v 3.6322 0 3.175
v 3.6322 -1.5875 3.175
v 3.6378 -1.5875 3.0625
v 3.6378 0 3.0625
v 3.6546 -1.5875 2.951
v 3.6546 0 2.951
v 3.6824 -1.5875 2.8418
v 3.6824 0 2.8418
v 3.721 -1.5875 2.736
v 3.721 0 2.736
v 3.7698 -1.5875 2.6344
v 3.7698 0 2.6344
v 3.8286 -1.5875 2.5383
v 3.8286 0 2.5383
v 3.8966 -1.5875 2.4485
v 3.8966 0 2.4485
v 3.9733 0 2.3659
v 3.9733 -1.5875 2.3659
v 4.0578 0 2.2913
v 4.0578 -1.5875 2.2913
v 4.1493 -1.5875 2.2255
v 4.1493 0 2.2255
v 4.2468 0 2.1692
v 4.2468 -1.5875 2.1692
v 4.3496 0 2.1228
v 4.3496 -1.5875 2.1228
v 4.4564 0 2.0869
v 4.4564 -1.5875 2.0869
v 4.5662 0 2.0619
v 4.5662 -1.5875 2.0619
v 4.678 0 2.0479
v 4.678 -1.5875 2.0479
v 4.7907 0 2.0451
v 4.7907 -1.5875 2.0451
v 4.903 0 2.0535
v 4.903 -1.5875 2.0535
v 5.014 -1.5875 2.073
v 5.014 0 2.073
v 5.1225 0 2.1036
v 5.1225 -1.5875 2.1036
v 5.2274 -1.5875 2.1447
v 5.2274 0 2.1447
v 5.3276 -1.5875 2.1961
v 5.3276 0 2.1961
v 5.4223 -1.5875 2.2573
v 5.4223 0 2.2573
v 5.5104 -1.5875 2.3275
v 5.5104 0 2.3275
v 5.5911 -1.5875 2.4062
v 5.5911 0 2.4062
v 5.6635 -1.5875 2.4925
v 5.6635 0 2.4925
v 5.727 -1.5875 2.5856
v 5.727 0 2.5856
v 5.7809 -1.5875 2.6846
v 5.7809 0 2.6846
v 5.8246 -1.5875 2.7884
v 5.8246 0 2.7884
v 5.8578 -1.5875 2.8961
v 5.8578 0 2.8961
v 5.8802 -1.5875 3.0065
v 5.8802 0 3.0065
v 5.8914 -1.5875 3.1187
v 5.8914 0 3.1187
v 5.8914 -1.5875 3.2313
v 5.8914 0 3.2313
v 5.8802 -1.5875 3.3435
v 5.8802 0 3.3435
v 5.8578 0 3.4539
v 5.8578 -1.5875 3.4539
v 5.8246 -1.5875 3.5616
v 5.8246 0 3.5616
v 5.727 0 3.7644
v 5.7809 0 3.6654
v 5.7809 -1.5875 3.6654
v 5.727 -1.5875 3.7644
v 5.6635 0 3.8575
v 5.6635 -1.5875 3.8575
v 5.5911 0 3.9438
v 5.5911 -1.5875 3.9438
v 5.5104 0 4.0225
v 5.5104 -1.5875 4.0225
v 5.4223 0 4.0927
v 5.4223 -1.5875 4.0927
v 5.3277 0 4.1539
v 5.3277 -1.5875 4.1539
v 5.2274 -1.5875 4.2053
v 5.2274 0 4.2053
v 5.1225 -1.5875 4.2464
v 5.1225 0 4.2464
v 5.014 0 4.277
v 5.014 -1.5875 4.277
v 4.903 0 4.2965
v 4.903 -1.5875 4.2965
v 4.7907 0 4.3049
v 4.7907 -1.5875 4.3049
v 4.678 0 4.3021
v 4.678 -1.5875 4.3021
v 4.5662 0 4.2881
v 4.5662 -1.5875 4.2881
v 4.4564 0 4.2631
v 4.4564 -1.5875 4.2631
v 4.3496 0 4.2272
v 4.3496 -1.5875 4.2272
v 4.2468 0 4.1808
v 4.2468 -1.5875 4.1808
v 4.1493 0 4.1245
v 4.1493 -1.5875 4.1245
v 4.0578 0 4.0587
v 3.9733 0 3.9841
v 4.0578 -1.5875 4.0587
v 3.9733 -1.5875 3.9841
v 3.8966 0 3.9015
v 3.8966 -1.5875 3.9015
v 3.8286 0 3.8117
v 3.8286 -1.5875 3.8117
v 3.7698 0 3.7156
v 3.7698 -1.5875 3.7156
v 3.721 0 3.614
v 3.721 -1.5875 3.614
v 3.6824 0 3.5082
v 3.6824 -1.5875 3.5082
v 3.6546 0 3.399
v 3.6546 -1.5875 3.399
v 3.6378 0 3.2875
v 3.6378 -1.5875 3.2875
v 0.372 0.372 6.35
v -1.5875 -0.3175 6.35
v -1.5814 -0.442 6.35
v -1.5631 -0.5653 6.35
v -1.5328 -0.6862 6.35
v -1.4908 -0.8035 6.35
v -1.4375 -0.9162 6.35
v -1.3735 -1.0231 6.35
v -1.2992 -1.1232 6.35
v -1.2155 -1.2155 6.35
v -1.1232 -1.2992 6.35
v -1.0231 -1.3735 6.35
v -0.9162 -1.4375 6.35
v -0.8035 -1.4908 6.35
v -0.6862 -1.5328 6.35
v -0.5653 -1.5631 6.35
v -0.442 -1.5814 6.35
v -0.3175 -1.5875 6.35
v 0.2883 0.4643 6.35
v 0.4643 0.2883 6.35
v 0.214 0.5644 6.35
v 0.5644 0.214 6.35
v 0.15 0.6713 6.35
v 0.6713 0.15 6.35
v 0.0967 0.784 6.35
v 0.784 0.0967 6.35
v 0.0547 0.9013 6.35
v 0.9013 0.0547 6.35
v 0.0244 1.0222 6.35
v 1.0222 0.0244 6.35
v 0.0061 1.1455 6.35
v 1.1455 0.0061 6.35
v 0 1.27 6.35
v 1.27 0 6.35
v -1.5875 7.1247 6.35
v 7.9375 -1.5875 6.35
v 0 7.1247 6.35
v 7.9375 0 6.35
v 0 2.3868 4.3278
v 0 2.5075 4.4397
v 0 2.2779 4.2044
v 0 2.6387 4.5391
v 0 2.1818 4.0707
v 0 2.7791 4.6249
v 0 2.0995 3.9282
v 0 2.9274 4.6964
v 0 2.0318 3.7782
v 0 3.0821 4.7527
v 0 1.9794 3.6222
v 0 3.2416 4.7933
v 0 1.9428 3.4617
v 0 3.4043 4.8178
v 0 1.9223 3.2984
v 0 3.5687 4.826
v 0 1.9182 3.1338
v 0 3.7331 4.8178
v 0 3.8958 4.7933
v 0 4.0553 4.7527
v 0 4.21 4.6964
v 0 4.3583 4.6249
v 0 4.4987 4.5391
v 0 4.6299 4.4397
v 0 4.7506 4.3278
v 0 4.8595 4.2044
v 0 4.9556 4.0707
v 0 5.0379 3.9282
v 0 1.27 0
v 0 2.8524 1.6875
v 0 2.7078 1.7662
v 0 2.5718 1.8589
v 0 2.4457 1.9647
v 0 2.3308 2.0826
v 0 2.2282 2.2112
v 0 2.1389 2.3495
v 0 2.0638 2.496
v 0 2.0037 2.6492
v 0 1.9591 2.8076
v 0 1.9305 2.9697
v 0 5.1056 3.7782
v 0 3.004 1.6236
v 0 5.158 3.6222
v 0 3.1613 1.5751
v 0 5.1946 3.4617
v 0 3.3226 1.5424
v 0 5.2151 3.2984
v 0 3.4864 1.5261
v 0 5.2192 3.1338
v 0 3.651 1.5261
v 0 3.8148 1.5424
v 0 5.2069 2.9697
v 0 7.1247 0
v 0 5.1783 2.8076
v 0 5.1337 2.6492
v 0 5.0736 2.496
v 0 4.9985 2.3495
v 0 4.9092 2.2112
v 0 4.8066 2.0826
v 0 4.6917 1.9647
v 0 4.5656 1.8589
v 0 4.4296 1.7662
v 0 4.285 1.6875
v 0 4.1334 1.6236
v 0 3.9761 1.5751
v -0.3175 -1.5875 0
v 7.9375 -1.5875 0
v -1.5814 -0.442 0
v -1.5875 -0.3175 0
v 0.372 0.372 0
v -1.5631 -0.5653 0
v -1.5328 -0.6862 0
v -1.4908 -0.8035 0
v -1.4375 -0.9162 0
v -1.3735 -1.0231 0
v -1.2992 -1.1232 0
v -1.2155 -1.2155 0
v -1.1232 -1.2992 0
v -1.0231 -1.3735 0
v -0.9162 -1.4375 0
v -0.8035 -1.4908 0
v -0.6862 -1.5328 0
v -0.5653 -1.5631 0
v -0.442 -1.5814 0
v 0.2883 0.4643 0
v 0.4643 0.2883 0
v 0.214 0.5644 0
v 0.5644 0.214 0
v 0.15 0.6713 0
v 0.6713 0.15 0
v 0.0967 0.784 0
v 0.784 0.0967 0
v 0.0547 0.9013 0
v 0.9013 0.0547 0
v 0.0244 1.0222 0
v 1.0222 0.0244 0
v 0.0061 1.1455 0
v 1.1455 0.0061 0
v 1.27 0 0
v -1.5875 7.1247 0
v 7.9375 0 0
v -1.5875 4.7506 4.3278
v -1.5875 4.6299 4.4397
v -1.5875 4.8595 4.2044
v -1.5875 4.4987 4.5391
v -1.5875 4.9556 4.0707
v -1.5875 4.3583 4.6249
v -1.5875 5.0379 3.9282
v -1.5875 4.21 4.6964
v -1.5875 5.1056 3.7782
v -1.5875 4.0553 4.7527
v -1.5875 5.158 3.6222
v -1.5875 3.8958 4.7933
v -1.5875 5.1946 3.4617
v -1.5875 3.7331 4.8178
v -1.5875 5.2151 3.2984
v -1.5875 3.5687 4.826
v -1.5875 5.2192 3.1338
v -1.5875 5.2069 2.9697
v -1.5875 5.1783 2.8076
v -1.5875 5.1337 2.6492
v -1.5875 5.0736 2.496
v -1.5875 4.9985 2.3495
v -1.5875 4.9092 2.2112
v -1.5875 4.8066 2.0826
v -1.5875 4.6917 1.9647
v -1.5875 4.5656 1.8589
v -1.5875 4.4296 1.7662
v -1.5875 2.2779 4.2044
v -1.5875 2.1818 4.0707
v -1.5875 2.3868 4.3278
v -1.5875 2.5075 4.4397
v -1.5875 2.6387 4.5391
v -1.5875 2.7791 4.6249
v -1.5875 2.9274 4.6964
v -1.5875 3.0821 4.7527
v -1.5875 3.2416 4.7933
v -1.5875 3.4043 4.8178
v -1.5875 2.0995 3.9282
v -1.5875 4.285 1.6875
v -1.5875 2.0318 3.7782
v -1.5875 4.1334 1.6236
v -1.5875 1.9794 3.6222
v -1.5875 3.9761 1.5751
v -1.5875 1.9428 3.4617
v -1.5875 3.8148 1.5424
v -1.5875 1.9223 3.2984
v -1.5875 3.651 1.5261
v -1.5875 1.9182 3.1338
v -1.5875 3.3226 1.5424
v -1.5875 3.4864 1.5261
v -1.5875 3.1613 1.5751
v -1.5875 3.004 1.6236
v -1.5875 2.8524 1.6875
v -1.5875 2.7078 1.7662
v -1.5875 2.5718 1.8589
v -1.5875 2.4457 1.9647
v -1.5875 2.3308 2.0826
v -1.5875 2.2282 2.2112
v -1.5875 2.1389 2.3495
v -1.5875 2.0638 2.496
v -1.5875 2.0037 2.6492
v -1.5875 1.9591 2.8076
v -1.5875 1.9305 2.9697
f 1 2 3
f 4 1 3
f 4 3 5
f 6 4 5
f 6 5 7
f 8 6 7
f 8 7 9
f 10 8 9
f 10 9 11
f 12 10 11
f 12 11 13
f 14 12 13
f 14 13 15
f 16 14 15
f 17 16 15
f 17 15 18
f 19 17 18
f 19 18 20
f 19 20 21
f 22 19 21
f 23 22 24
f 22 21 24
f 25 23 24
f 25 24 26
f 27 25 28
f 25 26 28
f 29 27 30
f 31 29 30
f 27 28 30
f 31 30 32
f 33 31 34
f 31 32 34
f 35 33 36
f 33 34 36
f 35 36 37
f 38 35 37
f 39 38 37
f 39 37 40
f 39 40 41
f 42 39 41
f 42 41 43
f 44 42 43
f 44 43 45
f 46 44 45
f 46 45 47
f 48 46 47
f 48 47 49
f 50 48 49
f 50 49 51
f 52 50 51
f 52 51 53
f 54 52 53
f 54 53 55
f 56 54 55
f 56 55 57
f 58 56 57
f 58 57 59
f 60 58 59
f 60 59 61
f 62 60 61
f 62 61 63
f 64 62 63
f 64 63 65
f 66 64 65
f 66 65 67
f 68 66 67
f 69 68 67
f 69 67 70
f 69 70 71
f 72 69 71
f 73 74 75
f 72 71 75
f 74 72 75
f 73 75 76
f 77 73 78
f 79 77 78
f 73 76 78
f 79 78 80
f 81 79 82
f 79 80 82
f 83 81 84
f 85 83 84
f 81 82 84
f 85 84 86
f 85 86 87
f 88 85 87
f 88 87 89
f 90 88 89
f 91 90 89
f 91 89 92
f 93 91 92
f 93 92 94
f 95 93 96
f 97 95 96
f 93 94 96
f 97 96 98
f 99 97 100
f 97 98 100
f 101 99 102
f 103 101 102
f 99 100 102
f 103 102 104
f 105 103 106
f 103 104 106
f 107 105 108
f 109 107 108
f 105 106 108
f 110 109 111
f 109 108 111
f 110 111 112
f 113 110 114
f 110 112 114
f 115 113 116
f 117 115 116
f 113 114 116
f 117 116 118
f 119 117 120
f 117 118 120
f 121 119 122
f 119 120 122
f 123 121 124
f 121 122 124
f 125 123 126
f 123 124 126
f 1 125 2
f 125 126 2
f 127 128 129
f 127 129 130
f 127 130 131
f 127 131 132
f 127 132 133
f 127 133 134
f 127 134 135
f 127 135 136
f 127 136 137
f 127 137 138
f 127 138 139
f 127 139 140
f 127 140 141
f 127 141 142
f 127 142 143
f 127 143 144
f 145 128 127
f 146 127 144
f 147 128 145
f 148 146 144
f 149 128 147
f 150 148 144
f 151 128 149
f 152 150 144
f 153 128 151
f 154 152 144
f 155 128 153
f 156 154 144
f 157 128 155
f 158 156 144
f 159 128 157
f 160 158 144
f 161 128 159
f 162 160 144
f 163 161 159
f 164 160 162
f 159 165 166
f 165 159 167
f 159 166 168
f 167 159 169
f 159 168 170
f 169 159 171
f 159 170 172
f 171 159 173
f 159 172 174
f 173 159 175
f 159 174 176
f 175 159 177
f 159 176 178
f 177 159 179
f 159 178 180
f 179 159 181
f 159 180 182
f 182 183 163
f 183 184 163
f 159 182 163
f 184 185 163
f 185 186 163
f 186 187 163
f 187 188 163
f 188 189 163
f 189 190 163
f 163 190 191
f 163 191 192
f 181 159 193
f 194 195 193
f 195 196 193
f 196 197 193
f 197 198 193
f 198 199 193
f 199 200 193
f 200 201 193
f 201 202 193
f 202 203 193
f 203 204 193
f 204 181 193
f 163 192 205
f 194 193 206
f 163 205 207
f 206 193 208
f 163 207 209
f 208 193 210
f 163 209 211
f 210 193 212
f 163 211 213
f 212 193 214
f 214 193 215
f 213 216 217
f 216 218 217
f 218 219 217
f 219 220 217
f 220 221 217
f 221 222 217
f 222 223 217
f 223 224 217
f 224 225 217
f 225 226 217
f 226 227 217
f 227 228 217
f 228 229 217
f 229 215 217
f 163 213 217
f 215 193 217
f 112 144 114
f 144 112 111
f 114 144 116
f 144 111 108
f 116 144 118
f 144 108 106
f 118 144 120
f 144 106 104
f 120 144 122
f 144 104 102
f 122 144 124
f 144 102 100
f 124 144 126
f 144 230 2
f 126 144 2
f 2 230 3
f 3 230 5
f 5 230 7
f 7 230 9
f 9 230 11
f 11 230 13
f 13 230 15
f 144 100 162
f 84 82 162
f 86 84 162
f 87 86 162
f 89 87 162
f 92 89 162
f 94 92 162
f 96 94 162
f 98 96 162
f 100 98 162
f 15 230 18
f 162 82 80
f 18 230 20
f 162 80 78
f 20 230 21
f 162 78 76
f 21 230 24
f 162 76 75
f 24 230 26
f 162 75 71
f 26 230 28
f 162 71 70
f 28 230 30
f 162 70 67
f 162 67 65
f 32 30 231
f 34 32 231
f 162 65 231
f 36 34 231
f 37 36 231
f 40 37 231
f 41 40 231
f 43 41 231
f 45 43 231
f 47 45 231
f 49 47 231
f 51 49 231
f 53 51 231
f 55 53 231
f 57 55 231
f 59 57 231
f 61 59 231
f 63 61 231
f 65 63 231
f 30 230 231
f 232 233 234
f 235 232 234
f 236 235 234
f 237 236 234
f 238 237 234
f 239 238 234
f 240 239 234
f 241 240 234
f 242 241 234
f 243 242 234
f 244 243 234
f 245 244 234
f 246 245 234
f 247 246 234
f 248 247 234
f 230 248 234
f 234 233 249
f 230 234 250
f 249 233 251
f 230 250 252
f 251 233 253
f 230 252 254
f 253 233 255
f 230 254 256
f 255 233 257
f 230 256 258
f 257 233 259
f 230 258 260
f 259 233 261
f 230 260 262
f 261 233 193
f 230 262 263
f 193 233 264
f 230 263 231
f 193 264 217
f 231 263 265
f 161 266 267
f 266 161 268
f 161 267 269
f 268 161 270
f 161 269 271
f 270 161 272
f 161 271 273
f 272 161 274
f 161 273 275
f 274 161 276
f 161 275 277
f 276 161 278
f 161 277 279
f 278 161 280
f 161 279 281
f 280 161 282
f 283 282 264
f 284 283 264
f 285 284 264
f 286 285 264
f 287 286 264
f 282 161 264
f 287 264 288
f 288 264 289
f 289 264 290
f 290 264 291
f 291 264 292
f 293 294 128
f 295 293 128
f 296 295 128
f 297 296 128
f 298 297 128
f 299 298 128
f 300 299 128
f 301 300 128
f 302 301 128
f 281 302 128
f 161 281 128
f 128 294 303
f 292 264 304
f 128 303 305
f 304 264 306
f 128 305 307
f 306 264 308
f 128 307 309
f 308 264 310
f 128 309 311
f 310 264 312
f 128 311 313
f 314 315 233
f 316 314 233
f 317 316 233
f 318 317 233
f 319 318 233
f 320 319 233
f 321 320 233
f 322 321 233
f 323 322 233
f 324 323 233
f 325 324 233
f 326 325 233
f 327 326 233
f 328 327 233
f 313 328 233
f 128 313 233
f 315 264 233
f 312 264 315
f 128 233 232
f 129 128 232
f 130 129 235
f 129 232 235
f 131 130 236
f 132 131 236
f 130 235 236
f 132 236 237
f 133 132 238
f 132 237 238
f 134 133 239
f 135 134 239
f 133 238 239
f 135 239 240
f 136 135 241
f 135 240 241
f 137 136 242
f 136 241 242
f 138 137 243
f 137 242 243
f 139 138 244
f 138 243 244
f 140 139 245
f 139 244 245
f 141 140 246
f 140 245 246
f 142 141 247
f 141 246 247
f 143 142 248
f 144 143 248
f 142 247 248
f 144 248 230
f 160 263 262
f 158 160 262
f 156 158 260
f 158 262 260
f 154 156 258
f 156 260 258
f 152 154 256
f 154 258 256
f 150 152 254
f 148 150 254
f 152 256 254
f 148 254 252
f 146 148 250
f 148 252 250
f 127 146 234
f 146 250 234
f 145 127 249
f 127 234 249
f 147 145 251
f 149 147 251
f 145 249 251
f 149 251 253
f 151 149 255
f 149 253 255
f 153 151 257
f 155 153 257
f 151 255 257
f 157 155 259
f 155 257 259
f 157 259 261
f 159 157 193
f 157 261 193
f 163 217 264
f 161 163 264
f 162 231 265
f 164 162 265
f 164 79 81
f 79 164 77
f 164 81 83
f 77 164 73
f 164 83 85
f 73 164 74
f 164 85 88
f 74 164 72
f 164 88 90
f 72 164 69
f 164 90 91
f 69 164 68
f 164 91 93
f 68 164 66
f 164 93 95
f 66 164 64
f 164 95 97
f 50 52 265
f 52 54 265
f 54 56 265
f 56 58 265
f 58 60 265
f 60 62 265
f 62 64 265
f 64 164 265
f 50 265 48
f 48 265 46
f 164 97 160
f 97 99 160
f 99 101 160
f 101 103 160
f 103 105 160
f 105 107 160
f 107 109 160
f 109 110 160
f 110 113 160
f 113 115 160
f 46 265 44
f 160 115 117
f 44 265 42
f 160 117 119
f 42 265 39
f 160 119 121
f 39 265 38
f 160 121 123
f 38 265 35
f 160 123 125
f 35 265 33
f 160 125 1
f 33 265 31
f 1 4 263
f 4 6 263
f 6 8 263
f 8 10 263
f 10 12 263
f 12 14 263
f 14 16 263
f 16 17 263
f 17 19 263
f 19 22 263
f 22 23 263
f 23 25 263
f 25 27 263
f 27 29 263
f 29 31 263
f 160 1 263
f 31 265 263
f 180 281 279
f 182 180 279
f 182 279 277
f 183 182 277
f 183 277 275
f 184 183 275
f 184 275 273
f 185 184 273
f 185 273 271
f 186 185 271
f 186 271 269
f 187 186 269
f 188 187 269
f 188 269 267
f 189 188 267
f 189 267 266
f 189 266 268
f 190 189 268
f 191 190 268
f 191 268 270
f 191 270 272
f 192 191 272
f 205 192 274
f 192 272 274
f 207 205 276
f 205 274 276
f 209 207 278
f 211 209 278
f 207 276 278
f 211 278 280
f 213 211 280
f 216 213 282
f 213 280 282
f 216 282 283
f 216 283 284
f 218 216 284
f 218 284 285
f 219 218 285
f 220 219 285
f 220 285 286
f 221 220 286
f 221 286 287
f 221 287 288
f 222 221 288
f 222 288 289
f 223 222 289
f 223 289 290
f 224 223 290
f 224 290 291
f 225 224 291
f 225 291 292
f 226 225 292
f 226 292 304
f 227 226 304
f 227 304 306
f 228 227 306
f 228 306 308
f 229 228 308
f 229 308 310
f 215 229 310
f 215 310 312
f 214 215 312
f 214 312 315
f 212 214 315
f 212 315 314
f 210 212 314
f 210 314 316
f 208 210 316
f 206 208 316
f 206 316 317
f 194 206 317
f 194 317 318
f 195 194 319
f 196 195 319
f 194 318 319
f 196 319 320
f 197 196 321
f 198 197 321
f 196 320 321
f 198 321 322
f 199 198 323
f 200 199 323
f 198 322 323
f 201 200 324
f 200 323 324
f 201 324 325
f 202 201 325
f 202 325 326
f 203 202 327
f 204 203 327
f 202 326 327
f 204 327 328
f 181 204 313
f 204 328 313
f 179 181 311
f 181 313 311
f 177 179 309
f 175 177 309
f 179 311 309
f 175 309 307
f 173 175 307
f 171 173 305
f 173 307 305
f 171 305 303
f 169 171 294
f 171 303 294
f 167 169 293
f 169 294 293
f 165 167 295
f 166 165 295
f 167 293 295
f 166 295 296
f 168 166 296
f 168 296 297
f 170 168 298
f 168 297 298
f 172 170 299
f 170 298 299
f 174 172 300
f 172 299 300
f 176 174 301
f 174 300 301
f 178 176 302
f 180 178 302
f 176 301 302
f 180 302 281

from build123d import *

# Parameters (mm, degrees)
BOSS_EXTRUDE1_DEPTH       = 6.35
F_4_CLEARANCE_HOLE1_D     = 3.302
F_4_CLEARANCE_HOLE1_DEPTH = 57.15
F_4_CLEARANCE_HOLE1_TIP   = 0.992020882
F_4_40_TAPPED_HOLE1_D     = 2.2606


with BuildPart() as part:
    # Sketch1 → Boss-Extrude1 (new body)
    with BuildSketch(Plane.XY):
        with BuildLine():
            Line((0, 1.27), (0, 7.1247))
            Line((0, 7.1247), (-1.5875, 7.1247))
            Line((-1.5875, 7.1247), (-1.5875, -0.3175))
            ThreePointArc((-1.5875, -0.3175), (-1.215525612, -1.215525612), (-0.3175, -1.5875))
            Line((-0.3175, -1.5875), (7.9375, -1.5875))
            Line((7.9375, -1.5875), (7.9375, 0))
            Line((7.9375, 0), (1.27, 0))
            ThreePointArc((1.27, 0), (0.371974388, 0.371974388), (0, 1.27))
        make_face()
    extrude(amount=BOSS_EXTRUDE1_DEPTH)

    # #4 Clearance Hole1
    with Locations(Plane(origin=(0, 0, 0), x_dir=(0, 0, -1), z_dir=(1, 0, 0))):
        with Locations((-3.175, 3.5687)):
            Hole(F_4_CLEARANCE_HOLE1_D / 2, depth=F_4_CLEARANCE_HOLE1_DEPTH)
            with Locations((0, 0, -(F_4_CLEARANCE_HOLE1_DEPTH + F_4_CLEARANCE_HOLE1_TIP / 2))):  # 118° drill point
                Cone(0, F_4_CLEARANCE_HOLE1_D / 2, F_4_CLEARANCE_HOLE1_TIP, mode=Mode.SUBTRACT)

    # #4-40 Tapped Hole1 (through all)
    with Locations(Plane(origin=(0, 0, 0), x_dir=(1, 0, 0), z_dir=(0, 1, 0))):
        with Locations((4.7625, -3.175)):
            Hole(F_4_40_TAPPED_HOLE1_D / 2)


solid = part.part
